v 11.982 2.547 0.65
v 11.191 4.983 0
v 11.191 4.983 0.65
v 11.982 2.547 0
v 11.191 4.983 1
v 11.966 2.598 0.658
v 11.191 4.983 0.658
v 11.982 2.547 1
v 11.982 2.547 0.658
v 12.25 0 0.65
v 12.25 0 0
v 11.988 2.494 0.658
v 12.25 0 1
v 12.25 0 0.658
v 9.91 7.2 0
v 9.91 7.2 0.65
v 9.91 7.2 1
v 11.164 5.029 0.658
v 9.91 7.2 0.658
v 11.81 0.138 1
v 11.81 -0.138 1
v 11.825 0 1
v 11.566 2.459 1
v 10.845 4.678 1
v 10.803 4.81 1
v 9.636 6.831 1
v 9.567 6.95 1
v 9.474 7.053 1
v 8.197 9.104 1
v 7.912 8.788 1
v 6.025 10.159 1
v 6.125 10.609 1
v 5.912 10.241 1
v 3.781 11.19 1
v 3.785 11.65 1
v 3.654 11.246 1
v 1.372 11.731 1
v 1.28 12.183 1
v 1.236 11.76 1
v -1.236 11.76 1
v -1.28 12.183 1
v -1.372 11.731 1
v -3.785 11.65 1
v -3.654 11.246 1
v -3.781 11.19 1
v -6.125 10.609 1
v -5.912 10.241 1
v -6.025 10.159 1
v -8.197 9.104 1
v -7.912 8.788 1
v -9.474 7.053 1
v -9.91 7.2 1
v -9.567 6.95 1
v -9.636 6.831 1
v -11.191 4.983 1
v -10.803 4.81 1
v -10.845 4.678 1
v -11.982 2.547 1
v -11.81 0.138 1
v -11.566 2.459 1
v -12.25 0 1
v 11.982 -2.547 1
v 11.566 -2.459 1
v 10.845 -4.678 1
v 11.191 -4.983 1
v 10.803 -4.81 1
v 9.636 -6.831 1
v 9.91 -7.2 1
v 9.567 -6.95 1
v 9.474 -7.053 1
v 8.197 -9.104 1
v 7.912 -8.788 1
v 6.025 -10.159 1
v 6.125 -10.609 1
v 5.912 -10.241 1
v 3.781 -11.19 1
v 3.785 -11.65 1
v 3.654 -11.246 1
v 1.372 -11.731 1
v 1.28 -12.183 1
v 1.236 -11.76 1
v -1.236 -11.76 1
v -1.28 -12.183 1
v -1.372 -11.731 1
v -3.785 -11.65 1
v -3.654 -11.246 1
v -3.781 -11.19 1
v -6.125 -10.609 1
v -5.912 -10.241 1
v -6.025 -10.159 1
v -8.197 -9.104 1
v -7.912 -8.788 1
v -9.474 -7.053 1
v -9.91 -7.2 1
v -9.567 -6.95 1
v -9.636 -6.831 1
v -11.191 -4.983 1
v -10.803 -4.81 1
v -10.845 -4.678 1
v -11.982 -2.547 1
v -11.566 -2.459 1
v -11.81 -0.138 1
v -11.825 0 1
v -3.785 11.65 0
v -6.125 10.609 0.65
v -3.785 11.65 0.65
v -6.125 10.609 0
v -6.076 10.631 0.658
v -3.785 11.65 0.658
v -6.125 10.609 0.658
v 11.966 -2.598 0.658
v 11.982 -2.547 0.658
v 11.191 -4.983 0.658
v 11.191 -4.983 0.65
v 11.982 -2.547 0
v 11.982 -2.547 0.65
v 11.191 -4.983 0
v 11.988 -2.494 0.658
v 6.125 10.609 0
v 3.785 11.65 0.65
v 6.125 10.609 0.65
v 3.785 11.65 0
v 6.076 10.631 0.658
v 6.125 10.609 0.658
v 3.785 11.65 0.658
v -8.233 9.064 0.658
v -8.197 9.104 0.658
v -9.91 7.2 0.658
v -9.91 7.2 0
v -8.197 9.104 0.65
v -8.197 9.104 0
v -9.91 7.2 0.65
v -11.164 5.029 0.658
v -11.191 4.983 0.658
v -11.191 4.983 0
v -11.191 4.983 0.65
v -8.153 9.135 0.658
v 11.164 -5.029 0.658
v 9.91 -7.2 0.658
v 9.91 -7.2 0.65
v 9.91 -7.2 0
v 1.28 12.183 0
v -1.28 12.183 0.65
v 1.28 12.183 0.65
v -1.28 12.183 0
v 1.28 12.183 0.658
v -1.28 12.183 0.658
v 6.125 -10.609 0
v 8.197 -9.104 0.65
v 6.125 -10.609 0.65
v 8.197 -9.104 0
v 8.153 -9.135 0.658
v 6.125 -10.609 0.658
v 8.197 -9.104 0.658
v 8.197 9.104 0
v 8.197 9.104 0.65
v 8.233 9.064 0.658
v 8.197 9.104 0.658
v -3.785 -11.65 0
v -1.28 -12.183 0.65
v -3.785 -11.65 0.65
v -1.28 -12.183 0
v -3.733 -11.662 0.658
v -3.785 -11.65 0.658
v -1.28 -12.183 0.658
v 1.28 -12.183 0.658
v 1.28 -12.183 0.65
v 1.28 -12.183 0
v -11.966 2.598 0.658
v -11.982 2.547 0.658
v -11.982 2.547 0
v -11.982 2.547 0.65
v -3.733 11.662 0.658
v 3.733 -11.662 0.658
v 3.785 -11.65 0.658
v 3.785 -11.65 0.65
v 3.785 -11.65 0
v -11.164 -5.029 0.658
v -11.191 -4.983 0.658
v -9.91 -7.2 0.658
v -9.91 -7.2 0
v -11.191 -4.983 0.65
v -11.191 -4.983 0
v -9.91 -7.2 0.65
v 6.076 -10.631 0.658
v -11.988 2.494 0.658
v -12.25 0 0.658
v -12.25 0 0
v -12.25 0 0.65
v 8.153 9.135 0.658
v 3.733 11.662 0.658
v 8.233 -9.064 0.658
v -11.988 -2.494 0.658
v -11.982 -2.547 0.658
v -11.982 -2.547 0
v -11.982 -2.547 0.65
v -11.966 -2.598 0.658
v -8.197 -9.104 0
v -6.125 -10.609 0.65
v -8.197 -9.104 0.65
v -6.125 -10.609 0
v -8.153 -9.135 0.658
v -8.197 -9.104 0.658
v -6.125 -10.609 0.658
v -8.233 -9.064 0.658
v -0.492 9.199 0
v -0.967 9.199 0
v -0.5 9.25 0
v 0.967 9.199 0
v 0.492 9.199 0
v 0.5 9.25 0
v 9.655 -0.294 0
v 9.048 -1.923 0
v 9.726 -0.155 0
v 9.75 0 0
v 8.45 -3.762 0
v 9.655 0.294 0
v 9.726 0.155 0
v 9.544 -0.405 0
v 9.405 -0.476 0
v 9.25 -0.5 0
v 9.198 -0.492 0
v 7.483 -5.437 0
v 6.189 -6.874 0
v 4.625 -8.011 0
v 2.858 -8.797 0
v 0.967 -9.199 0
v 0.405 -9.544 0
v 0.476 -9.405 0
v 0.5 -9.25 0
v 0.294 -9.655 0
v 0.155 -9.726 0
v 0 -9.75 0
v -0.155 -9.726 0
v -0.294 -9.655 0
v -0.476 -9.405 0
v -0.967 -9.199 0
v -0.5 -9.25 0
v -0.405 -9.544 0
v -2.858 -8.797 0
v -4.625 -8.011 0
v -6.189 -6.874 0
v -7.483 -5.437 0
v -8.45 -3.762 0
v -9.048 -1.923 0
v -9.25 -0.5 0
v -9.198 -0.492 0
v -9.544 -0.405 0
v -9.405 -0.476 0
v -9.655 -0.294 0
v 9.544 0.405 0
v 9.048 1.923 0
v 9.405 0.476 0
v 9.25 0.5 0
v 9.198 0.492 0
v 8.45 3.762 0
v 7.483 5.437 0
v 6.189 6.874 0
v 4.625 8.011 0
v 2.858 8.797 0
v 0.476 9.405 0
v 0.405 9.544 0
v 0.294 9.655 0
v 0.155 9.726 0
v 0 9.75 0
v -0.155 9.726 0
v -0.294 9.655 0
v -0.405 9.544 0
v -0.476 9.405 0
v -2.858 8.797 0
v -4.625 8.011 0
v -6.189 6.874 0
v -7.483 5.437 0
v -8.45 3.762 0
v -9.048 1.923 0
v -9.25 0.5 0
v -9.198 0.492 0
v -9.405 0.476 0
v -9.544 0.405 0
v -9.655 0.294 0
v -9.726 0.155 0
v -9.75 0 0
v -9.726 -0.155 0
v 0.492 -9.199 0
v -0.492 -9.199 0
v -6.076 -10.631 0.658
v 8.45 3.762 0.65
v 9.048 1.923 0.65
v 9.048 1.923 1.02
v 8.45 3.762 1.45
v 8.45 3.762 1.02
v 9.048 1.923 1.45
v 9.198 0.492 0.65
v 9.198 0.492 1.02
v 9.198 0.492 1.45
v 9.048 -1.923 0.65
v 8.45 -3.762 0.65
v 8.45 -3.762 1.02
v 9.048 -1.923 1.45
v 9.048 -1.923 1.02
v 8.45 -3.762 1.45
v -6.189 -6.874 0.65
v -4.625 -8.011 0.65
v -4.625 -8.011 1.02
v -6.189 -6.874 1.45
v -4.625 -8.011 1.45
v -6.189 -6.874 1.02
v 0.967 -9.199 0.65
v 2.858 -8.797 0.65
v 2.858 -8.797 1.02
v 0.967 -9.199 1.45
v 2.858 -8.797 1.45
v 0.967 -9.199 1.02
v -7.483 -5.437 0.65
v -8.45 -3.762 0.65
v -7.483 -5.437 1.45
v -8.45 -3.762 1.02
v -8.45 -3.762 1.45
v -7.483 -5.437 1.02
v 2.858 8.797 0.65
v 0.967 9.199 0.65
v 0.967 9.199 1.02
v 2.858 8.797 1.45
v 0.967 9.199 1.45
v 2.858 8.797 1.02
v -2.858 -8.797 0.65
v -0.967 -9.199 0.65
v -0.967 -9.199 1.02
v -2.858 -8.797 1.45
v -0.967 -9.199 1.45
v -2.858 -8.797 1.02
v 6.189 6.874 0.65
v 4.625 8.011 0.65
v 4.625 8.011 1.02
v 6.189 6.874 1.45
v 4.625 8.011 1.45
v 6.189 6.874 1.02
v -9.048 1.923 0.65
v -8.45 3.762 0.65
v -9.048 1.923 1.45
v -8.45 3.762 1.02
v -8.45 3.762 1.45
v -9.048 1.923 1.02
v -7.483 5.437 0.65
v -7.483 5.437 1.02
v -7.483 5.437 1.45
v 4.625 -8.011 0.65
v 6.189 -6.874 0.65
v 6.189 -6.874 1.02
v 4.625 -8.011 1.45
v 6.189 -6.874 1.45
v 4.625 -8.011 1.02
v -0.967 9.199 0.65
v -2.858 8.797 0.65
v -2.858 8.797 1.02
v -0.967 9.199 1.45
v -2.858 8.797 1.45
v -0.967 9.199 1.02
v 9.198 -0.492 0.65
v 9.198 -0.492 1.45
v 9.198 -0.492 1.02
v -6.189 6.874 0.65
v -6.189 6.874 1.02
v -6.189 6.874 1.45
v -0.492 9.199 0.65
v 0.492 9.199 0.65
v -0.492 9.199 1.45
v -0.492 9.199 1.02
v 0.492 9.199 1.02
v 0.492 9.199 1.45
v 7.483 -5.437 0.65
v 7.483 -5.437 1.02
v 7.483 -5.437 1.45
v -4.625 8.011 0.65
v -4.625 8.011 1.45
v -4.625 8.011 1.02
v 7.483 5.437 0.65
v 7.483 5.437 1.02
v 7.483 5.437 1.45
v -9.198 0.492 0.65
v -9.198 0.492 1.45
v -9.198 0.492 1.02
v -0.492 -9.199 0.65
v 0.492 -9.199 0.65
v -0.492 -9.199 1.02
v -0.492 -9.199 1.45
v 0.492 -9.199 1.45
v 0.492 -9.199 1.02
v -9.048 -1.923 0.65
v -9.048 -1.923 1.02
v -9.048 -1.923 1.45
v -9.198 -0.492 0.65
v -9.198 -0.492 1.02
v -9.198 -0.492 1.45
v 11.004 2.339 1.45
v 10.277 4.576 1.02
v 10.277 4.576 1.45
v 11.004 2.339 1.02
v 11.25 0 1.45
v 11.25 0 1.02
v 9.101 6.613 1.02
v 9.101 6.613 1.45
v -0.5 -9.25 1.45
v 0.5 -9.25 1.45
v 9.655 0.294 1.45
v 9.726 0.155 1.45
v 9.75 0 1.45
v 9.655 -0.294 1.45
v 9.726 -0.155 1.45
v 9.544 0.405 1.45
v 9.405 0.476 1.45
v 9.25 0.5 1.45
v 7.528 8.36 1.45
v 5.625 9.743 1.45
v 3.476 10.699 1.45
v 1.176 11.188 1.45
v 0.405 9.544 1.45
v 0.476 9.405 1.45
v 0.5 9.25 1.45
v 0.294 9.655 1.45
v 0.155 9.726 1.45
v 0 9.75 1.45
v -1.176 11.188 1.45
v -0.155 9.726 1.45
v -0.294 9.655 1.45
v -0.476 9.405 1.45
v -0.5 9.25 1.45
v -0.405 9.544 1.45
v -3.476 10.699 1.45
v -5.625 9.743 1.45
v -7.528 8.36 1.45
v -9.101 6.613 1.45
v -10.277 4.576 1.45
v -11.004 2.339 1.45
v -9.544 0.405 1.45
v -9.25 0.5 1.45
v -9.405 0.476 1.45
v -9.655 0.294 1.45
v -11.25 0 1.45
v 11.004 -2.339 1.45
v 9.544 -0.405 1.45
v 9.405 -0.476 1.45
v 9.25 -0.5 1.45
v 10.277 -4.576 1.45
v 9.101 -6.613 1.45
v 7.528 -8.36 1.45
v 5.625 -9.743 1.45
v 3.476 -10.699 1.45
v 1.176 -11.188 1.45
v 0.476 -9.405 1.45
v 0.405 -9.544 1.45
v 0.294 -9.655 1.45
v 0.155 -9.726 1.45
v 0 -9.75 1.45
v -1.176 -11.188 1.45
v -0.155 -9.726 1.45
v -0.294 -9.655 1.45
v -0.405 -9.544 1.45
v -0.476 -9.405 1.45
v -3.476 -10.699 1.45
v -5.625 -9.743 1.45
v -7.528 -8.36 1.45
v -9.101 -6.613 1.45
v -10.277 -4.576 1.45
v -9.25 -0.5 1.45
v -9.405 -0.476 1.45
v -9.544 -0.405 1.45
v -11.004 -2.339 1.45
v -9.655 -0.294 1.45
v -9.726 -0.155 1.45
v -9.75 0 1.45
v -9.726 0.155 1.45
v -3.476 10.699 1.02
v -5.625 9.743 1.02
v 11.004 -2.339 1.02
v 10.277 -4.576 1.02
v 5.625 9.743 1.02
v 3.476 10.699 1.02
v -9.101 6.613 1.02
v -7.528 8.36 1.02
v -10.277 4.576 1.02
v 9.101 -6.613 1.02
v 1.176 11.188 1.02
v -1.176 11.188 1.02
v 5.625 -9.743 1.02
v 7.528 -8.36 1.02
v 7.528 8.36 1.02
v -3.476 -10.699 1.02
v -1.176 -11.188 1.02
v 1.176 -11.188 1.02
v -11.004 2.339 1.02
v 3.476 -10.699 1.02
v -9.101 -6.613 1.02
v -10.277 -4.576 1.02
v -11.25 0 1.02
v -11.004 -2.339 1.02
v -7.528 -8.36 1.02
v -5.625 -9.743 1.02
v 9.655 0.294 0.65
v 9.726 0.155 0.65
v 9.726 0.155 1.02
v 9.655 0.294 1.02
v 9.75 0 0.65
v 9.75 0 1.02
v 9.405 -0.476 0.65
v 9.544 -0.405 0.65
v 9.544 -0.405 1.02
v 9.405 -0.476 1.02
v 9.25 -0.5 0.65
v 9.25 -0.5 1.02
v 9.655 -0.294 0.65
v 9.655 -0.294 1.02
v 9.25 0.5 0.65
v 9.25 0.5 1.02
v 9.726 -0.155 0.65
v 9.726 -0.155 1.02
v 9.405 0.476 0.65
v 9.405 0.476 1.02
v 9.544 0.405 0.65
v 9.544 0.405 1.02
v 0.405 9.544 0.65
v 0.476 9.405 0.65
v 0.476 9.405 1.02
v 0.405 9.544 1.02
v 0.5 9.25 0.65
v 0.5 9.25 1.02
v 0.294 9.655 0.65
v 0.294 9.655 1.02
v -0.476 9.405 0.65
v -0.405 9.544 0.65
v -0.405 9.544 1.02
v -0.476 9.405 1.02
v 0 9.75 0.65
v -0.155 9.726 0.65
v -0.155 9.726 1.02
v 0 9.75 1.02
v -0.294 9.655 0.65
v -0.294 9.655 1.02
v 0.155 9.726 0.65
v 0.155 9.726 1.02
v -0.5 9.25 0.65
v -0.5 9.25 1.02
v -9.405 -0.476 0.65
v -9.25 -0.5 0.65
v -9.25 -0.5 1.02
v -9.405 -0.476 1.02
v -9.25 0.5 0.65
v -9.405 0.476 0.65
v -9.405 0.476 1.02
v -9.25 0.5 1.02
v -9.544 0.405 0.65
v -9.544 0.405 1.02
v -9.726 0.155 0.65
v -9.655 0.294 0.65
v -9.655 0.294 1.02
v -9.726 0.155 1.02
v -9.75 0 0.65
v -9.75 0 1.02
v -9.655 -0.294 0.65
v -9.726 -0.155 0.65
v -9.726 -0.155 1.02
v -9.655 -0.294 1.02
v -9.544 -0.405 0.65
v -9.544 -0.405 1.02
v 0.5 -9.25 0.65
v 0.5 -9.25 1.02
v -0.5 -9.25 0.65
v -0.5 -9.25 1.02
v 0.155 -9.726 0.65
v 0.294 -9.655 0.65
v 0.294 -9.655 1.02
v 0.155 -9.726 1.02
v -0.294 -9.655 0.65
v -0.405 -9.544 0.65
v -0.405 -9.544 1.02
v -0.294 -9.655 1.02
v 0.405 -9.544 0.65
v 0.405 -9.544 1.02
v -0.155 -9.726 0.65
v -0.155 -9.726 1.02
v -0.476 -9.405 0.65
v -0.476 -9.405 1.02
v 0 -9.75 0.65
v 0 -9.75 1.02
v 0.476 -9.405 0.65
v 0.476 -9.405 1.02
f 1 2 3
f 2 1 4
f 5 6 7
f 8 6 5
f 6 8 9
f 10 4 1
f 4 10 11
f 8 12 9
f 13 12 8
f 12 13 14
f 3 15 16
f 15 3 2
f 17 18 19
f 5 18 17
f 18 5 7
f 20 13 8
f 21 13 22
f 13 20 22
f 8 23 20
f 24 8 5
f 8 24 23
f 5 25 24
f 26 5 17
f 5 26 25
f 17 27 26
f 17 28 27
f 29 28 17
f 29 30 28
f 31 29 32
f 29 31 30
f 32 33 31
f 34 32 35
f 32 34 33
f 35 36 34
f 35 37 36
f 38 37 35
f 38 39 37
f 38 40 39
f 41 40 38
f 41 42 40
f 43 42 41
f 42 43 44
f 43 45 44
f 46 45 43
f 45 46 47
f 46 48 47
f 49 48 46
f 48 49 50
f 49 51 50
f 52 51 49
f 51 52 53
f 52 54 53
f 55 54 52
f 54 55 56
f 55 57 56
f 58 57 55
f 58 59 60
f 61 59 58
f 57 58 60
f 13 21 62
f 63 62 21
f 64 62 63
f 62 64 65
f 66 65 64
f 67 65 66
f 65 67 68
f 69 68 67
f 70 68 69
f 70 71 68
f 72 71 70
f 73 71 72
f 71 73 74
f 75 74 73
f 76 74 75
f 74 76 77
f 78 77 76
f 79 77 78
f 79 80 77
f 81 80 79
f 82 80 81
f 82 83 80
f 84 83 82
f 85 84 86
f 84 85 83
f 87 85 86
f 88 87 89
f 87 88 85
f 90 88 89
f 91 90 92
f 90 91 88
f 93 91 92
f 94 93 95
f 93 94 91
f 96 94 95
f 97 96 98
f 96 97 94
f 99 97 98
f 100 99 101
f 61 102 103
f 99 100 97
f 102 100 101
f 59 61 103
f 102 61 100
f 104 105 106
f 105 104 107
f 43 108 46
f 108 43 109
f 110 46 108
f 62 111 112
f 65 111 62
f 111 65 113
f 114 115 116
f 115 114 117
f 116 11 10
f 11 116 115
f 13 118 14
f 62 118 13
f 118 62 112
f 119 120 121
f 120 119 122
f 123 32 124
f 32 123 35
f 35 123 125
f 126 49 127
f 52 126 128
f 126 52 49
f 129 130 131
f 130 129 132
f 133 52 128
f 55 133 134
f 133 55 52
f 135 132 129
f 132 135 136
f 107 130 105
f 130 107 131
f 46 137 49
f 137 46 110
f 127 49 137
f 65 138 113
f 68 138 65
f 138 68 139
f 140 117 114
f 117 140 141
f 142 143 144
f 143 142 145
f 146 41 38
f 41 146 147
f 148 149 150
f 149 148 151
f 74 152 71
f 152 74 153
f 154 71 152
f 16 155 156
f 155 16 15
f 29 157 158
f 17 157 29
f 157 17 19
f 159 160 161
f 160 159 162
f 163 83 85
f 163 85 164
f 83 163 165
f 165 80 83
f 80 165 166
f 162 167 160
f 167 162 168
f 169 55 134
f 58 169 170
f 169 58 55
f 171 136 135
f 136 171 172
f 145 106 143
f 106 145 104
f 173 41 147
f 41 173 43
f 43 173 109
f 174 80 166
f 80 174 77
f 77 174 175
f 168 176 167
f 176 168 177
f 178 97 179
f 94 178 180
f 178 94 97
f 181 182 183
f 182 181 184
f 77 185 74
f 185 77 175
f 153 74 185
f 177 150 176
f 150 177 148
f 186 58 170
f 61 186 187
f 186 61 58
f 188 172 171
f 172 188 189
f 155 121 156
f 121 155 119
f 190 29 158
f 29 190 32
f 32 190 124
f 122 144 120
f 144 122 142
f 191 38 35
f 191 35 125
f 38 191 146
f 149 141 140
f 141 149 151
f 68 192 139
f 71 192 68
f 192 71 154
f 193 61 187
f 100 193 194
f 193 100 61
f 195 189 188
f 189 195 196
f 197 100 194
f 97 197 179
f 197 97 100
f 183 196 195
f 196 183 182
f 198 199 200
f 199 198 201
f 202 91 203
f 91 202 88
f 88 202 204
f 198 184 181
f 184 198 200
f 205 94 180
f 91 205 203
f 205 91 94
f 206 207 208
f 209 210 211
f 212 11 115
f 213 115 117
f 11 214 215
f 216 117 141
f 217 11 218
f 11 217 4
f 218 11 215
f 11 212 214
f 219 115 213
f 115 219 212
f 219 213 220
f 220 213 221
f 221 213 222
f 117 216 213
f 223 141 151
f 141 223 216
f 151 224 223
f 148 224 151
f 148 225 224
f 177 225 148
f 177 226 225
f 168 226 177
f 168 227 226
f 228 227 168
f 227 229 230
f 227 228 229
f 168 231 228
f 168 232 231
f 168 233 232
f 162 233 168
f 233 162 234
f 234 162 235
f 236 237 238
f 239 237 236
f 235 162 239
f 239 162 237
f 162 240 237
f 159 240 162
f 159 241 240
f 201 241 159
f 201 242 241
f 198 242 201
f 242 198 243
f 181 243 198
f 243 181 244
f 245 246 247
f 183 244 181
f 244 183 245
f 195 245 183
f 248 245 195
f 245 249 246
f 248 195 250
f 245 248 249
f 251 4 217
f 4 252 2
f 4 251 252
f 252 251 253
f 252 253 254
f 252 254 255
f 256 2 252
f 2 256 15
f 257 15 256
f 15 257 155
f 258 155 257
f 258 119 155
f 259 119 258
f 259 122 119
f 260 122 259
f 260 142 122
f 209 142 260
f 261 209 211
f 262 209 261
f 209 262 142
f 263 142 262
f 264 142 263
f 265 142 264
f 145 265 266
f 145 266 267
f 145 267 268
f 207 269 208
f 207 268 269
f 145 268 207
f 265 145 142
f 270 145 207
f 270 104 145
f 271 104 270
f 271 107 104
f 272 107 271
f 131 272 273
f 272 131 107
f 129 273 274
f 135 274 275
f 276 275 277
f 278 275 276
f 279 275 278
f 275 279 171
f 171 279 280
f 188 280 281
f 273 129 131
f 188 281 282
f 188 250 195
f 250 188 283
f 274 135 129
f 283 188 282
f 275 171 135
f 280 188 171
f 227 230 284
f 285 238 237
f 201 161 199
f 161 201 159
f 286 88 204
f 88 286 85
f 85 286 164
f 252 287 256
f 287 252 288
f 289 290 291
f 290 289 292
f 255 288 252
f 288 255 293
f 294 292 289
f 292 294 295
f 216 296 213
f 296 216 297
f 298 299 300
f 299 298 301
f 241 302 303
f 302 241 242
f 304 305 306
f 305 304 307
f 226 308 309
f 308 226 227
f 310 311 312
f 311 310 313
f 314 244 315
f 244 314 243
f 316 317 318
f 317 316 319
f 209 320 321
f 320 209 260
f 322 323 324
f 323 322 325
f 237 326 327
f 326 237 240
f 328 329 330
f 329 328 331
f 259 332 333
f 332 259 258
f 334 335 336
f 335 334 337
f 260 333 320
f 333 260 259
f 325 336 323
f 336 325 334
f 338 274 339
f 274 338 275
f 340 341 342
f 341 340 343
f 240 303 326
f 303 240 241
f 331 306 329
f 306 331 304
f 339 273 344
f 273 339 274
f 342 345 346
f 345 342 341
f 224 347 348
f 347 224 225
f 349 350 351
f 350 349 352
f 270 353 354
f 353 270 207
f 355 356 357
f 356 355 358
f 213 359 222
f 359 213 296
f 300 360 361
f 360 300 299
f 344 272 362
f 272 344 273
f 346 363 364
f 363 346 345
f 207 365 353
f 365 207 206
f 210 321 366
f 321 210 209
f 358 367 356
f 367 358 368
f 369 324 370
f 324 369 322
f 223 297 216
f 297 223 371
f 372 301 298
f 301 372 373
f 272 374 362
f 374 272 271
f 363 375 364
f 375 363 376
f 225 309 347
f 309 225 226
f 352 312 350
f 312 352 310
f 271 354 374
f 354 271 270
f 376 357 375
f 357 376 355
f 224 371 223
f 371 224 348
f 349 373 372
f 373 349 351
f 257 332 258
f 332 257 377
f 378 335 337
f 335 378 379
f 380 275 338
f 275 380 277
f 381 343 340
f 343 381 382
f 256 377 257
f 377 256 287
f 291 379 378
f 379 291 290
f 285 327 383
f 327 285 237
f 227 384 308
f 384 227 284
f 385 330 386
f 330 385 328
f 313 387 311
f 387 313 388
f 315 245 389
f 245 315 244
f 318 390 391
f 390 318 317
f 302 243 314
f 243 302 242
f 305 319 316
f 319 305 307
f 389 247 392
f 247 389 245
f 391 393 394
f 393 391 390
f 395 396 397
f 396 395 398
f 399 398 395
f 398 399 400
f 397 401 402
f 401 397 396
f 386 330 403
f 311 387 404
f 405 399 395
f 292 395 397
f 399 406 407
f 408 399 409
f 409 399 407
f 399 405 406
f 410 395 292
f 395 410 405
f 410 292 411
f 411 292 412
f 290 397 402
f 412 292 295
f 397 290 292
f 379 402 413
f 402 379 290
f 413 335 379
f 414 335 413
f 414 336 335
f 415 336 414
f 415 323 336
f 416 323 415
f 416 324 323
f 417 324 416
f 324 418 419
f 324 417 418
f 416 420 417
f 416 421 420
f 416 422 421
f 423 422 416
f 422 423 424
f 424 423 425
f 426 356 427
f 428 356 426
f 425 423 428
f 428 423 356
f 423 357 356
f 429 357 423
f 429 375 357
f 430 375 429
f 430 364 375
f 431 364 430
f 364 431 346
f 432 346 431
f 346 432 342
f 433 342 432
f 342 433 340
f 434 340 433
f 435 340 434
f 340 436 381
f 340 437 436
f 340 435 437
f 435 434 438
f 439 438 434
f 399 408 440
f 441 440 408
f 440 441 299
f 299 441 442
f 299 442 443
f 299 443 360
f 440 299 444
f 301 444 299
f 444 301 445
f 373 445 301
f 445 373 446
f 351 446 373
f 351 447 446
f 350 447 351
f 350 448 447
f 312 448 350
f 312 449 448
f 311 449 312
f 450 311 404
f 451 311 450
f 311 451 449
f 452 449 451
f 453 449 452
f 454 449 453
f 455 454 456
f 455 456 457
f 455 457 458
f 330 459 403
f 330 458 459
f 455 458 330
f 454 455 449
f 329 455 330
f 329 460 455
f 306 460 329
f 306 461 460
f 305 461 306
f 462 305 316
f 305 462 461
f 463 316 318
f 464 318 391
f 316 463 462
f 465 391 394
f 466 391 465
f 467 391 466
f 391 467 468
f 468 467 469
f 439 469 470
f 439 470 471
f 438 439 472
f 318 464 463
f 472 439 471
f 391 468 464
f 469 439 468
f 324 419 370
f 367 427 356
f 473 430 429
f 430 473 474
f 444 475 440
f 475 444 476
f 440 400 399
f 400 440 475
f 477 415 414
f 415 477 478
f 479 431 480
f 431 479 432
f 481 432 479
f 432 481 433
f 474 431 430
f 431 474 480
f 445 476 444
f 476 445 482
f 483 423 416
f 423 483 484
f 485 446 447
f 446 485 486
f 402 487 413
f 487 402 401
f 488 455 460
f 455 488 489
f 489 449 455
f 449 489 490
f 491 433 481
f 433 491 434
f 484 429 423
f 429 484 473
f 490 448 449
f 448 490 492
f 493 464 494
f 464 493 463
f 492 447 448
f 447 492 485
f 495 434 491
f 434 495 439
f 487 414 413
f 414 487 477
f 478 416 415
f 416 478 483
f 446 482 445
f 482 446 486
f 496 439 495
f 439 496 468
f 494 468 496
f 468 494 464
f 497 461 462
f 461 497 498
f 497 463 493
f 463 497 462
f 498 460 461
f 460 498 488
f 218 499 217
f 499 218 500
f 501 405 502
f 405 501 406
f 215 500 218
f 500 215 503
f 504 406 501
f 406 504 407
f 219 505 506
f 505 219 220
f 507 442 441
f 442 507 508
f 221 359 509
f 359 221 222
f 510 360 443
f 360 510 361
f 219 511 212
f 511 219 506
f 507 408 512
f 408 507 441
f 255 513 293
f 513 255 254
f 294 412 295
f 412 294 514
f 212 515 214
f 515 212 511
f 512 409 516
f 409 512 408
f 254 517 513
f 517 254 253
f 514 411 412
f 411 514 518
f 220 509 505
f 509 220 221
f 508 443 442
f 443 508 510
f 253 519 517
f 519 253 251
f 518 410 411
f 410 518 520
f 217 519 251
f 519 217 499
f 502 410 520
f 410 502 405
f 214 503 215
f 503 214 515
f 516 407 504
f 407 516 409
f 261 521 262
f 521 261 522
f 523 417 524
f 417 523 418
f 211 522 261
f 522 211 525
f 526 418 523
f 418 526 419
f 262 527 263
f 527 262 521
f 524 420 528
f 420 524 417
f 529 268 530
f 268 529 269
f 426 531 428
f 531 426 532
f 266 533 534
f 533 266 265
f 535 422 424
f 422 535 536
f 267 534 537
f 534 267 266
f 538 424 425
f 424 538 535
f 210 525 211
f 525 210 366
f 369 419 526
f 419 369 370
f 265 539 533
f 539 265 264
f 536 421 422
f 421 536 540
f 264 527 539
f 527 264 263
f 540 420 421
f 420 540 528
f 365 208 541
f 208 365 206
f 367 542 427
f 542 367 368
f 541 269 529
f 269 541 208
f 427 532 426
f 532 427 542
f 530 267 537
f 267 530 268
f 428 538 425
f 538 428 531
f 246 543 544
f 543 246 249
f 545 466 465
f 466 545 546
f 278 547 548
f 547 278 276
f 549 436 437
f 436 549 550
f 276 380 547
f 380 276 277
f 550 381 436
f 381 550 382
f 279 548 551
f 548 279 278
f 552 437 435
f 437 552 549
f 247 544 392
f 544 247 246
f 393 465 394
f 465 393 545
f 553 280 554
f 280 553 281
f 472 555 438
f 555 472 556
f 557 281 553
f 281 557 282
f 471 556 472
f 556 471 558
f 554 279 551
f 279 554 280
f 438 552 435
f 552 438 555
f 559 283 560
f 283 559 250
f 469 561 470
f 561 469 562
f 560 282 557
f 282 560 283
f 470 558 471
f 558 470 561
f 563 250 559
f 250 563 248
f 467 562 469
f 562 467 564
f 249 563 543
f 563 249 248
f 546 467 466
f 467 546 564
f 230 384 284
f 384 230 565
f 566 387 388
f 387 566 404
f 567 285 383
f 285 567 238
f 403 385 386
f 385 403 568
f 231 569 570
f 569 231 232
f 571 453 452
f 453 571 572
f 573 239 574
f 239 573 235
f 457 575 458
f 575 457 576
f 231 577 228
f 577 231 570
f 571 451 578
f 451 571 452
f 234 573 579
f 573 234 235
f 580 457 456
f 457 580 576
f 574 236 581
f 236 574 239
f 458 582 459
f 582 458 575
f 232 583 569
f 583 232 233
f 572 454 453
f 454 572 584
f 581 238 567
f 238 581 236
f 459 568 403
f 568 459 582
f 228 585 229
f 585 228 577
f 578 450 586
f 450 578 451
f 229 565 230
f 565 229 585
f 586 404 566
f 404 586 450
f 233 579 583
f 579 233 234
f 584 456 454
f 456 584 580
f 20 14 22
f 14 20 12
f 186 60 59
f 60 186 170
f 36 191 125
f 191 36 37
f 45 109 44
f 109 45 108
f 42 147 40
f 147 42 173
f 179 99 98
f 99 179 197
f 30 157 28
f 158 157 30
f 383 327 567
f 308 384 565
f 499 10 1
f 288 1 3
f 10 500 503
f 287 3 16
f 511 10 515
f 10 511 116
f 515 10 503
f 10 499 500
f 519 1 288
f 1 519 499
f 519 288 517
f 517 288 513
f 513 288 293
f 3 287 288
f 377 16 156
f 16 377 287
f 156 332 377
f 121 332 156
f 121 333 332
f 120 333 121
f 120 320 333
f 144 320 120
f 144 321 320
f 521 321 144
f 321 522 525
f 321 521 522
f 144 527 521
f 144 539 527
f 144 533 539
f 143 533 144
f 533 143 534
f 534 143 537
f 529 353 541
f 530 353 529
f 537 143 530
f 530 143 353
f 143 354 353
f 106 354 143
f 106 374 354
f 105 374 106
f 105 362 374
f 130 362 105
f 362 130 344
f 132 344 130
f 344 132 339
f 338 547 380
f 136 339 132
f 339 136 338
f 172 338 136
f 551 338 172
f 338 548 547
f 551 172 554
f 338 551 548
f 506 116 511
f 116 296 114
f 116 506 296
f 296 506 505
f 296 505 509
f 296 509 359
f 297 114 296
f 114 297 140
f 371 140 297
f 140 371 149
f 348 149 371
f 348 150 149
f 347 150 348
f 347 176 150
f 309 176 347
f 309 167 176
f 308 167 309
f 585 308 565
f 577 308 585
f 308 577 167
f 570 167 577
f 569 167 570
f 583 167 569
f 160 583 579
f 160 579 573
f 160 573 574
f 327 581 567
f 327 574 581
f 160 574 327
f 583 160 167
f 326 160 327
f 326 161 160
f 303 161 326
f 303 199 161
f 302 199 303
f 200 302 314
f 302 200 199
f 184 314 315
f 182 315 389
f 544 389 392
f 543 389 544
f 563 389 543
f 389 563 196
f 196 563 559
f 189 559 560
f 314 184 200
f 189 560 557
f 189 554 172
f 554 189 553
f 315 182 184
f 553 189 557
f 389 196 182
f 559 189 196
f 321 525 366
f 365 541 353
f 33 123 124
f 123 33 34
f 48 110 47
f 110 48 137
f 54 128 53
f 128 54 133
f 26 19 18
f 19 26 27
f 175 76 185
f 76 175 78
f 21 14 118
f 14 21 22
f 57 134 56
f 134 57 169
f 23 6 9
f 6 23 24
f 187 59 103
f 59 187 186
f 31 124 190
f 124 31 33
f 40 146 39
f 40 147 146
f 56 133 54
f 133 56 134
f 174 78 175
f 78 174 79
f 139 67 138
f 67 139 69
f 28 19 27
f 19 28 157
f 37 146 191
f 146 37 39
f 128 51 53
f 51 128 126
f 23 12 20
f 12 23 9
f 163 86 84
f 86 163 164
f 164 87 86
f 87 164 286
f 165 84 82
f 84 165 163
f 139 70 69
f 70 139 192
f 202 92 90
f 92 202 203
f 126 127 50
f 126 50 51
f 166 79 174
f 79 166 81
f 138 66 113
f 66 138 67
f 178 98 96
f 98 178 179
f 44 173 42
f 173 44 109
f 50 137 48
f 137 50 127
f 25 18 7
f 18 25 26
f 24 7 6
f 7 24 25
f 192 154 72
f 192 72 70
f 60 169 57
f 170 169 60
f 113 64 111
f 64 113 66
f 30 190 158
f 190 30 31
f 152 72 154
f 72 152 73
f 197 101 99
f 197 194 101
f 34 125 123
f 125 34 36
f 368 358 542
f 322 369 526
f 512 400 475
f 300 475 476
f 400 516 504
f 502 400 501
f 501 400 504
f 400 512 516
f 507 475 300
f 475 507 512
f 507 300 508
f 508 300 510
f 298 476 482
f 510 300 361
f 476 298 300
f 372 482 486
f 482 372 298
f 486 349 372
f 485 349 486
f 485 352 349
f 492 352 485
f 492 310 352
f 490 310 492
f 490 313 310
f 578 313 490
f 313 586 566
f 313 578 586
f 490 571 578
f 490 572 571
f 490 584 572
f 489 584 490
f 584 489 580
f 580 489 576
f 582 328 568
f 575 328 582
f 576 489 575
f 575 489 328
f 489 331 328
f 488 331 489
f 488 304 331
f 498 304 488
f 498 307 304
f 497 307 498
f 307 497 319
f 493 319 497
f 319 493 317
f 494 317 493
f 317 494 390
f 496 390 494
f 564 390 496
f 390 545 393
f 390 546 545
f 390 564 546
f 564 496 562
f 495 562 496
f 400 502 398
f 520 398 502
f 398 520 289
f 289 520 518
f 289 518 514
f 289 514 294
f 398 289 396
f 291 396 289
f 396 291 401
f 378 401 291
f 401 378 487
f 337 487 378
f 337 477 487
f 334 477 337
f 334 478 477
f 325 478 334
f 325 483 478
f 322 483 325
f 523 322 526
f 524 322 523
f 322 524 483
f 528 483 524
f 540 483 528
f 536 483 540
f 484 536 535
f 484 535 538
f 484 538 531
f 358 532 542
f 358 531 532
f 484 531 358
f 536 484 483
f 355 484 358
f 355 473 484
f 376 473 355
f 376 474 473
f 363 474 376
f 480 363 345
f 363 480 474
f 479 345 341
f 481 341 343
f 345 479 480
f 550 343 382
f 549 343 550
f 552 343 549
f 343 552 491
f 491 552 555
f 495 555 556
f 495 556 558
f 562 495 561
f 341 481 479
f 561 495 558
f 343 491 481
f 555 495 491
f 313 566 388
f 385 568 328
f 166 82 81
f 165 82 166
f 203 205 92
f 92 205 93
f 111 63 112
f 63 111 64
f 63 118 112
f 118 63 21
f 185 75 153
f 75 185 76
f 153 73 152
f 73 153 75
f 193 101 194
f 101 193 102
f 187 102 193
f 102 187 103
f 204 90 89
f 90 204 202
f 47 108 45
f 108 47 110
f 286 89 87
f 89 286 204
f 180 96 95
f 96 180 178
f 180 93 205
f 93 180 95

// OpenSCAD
// part_id: dat8
// name: Date pointer friction ring (inner)
// source_drawing_ids: DRW-008
// units: mm
// revision: 0.1
// SPDX-License-Identifier: MIT

module part_dat8(
    outer_d = 24.5,
    inner_d = 18.5,
    body_h = 1.0,
    shoulder_od = 22.5,
    shoulder_h = 0.45,
    rivet_d = 1.0,
    rivet_pcd = 18.5,
    rivet_count = 4,
    chamfer_h = 0.35
) {
    difference() {
        union() {
            difference() {
                cylinder(d = outer_d, h = body_h, center = false);
                translate([0, 0, -0.05]) cylinder(d = inner_d, h = body_h + 0.1, center = false);
            }

            translate([0, 0, body_h])
            difference() {
                cylinder(d = shoulder_od, h = shoulder_h, center = false);
                translate([0, 0, -0.05]) cylinder(d = inner_d, h = shoulder_h + 0.1, center = false);
            }
        }

        // Light outer chamfer to match the drawing profile style.
        translate([0, 0, body_h - chamfer_h])
            cylinder(d1 = outer_d + 0.02, d2 = outer_d - 0.9, h = chamfer_h + 0.02, center = false);

        for (i = [0 : rivet_count - 1]) {
            a = i * 360 / rivet_count;
            translate([
                (rivet_pcd / 2) * cos(a),
                (rivet_pcd / 2) * sin(a),
                -0.1
            ]) cylinder(d = rivet_d, h = body_h + shoulder_h + 0.2, center = false, $fn = 20);
        }
    }
}

// ---- "main guard" ----
// Default to previewing when opened directly:
if (is_undef(__LIB_MODE__)) {
    part_dat8();
}
